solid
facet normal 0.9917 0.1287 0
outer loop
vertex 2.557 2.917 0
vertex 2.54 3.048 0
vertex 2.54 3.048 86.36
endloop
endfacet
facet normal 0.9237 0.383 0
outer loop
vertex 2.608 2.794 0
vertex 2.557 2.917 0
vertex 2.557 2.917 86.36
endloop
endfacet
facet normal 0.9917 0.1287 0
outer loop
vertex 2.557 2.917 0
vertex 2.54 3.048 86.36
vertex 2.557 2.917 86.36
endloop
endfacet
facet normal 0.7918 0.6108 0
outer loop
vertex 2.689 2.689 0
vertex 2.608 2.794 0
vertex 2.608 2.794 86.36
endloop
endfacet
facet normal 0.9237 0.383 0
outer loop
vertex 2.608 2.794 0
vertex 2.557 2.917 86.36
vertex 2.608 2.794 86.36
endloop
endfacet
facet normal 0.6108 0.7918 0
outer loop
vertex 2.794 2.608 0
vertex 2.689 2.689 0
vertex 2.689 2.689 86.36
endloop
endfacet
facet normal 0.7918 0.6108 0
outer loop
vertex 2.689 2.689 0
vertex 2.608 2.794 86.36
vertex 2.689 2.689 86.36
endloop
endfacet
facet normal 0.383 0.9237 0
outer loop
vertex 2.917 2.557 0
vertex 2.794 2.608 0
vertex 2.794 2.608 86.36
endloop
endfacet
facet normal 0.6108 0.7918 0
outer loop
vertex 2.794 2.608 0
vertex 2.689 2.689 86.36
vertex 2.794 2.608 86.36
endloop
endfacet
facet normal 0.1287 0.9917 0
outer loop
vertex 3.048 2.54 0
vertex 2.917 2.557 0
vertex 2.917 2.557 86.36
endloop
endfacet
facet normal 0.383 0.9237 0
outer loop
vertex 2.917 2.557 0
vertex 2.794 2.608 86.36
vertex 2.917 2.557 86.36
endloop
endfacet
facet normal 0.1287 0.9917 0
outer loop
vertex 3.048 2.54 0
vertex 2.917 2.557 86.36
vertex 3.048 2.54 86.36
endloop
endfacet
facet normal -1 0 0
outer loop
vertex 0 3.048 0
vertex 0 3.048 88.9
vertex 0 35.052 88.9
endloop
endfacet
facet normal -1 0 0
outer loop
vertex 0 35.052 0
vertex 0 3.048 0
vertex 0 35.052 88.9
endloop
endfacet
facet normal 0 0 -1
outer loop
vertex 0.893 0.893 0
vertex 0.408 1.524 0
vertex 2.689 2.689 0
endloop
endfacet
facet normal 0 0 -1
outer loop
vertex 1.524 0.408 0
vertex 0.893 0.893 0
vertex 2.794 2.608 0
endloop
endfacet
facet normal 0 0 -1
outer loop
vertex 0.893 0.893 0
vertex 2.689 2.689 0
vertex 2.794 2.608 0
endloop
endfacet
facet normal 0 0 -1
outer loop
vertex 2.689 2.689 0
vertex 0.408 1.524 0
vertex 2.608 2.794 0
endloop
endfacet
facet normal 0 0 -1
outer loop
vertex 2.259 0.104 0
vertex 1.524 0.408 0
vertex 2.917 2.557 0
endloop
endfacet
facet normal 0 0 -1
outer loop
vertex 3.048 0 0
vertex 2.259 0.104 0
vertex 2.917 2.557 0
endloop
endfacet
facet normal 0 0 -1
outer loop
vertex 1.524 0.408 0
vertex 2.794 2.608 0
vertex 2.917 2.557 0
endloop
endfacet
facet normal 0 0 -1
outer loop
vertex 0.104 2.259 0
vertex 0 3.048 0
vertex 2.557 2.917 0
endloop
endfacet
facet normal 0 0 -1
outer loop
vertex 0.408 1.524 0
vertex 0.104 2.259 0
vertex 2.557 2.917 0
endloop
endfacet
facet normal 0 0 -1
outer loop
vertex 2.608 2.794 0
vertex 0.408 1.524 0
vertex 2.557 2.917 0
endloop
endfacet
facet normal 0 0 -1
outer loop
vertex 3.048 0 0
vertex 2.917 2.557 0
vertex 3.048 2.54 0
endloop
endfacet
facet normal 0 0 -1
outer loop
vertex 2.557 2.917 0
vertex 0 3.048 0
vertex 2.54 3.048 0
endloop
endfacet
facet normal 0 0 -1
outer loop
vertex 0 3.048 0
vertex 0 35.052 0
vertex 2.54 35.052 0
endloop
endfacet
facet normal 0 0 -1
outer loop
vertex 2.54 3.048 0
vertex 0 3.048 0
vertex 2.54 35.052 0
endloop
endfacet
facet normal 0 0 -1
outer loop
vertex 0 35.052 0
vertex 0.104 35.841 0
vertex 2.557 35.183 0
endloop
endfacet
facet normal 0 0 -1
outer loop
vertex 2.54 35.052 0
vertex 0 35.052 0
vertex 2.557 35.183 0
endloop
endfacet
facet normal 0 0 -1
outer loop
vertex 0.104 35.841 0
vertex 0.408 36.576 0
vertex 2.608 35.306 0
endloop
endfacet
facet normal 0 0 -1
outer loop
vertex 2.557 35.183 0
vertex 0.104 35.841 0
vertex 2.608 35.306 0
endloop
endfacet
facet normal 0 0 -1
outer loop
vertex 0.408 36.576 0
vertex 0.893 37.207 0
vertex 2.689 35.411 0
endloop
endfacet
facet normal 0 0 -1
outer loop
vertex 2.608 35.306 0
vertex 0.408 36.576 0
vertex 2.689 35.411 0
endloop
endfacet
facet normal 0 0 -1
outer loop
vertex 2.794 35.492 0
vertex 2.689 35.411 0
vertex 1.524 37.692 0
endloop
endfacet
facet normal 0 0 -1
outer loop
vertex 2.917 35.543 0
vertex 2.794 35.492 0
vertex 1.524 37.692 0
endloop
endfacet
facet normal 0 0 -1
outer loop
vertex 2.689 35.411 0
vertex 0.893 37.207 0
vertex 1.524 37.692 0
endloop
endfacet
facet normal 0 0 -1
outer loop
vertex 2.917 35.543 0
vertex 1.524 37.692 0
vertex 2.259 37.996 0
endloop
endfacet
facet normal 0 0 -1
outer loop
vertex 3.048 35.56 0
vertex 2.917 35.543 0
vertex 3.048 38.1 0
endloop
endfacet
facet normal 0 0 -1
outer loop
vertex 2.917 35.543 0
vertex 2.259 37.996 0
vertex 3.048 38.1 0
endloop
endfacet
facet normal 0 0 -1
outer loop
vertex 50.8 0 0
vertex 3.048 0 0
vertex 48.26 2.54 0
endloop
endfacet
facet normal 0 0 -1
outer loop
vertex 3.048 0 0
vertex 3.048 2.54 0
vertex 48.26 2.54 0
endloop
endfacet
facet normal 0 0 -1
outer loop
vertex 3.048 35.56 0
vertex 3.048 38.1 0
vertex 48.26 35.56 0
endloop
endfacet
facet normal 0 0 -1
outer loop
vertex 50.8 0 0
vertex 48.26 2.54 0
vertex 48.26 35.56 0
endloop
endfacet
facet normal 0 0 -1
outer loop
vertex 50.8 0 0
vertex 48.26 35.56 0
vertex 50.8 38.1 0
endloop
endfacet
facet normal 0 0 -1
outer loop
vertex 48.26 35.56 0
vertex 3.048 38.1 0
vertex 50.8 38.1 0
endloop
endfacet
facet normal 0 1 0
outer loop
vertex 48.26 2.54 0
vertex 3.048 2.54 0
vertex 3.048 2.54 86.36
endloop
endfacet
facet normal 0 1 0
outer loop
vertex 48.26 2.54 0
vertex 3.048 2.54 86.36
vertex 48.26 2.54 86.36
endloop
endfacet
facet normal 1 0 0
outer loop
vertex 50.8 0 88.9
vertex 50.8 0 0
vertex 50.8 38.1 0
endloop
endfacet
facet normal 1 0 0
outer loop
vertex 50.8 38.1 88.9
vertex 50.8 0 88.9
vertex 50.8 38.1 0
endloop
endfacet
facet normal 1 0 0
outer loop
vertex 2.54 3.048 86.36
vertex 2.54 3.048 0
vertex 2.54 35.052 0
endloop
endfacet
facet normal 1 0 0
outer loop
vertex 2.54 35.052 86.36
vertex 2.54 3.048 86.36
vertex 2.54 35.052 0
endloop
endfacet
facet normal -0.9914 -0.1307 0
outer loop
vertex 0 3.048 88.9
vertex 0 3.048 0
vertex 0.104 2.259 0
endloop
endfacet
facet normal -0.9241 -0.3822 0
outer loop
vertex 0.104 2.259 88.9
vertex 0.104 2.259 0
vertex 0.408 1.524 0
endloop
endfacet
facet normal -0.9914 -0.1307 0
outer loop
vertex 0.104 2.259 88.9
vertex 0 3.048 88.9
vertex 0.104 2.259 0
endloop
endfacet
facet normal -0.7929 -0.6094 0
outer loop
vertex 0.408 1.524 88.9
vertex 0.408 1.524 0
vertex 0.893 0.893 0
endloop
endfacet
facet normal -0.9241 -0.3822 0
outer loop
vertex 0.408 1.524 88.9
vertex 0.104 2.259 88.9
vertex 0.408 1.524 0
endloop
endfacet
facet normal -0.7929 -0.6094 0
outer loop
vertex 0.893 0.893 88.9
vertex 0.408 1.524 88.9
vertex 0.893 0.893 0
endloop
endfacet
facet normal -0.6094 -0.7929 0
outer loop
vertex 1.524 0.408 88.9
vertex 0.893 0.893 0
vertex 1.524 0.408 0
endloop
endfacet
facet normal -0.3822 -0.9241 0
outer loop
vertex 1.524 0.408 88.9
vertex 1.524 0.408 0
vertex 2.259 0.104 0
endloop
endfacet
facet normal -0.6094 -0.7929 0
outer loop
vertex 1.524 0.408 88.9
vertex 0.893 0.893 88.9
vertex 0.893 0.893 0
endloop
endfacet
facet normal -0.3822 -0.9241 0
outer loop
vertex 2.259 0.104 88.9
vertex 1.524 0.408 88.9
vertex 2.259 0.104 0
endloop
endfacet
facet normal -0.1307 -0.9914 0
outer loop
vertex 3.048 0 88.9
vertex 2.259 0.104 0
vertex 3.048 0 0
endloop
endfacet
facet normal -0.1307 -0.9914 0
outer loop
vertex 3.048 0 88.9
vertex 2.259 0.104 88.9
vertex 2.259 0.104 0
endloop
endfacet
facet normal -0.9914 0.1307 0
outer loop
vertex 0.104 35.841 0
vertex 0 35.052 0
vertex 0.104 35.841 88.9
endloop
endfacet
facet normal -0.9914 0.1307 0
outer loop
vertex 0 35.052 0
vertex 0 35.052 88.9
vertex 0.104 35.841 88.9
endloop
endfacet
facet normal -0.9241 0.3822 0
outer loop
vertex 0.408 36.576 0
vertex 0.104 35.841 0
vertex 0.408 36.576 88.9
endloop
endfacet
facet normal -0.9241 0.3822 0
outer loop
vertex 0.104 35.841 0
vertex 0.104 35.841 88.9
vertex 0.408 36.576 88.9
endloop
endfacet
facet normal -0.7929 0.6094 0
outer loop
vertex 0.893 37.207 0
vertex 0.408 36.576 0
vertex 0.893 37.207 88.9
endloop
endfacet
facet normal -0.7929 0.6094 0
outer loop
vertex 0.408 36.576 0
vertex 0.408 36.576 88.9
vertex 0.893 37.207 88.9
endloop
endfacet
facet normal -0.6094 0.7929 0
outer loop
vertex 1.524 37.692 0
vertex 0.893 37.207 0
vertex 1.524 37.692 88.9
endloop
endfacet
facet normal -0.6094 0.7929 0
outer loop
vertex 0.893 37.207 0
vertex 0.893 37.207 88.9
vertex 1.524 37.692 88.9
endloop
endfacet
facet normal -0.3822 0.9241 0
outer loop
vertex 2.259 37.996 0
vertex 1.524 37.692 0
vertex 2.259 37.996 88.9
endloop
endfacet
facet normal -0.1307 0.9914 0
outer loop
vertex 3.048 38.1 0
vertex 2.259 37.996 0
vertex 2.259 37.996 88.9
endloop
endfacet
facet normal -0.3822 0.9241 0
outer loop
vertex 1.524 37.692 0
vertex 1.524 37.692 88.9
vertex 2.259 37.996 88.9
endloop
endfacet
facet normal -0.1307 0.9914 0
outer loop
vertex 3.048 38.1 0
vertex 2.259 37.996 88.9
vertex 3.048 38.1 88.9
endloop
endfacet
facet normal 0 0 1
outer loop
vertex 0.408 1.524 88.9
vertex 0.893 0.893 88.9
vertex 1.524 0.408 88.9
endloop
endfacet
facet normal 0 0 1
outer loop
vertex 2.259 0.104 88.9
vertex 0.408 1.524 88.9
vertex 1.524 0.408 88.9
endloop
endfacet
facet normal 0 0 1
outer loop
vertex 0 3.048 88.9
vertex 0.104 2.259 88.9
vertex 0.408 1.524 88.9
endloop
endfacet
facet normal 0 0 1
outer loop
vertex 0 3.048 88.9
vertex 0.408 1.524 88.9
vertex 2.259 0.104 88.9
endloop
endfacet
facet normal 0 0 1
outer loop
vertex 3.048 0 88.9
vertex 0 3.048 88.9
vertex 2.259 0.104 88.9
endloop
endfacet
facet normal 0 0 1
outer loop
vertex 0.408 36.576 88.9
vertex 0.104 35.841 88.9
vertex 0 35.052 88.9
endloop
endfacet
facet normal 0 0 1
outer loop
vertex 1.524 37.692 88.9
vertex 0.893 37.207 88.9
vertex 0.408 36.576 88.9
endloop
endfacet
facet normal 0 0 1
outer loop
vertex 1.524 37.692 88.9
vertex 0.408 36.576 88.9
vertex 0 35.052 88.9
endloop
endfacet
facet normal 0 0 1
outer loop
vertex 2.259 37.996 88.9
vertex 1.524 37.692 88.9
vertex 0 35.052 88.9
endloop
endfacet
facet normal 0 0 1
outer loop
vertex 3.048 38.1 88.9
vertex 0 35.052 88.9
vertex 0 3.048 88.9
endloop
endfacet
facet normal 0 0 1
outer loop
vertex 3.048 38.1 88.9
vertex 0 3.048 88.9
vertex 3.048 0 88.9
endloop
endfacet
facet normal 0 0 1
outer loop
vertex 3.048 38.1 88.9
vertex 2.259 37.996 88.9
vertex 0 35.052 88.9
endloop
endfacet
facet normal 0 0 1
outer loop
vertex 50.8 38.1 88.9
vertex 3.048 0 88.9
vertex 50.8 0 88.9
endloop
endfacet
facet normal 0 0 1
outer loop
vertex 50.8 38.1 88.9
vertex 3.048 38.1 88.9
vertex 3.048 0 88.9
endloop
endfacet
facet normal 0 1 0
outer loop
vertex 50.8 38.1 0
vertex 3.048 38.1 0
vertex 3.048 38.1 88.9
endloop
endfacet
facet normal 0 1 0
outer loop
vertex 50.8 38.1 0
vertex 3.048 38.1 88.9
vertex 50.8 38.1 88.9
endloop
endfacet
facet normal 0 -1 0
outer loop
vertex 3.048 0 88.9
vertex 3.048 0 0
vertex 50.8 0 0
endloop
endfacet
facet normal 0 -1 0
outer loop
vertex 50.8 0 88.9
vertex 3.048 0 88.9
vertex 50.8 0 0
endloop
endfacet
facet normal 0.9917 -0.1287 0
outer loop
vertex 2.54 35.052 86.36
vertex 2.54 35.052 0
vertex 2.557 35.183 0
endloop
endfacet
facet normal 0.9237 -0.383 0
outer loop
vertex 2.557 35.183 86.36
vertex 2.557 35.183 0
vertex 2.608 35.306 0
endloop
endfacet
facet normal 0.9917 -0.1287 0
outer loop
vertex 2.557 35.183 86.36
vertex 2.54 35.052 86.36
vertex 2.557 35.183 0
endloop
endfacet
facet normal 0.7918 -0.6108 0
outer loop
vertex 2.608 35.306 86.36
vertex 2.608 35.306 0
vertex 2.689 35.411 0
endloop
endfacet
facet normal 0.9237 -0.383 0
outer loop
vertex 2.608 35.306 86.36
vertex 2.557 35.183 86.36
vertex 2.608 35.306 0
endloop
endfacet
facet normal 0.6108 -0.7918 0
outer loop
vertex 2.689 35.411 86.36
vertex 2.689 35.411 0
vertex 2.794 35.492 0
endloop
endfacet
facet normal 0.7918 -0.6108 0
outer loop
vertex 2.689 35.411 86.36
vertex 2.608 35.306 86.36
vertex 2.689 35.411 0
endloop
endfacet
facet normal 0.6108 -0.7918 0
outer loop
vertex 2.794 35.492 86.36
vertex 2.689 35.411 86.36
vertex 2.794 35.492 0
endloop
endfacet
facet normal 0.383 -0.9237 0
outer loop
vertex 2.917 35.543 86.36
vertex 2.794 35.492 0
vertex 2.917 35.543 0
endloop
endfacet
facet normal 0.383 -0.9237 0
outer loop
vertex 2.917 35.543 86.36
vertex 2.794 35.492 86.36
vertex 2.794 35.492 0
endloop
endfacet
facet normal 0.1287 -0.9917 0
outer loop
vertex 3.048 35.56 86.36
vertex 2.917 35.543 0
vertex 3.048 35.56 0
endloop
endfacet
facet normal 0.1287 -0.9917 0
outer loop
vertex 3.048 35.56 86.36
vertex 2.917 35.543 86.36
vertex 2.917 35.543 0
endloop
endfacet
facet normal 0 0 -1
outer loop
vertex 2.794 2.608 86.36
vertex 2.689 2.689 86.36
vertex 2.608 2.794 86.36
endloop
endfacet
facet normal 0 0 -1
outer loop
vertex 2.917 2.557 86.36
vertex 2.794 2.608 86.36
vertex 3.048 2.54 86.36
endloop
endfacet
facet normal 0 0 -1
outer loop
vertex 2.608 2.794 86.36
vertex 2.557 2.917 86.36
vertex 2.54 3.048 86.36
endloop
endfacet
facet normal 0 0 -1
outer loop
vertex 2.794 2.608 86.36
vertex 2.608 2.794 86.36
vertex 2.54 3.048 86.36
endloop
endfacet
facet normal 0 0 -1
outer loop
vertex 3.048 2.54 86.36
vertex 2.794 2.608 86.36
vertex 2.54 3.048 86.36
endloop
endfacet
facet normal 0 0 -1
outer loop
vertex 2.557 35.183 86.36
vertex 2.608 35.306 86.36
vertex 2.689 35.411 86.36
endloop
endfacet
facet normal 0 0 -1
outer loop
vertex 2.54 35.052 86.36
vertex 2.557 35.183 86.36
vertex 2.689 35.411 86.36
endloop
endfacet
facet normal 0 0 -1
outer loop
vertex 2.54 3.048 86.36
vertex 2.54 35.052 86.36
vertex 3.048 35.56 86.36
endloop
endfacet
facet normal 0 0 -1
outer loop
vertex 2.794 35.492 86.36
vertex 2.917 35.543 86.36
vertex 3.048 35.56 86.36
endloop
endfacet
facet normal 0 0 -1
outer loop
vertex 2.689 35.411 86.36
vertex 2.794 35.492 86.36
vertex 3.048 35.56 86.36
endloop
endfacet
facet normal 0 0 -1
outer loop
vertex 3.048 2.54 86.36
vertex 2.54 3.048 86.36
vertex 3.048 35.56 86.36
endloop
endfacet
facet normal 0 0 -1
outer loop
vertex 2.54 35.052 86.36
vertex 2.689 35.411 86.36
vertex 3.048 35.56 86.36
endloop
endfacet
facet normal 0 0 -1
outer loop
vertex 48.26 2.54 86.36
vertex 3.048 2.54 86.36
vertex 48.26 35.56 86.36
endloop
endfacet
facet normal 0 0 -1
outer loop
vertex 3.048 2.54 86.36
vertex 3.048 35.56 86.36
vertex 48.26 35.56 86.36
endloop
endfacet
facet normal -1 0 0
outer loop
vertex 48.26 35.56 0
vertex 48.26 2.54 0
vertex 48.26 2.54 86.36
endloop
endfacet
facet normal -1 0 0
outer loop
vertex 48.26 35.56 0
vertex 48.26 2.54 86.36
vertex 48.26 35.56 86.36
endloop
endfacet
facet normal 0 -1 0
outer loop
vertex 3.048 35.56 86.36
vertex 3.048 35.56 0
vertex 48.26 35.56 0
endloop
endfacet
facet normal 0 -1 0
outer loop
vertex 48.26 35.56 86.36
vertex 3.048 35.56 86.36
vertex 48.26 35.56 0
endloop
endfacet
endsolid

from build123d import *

# Parameters (mm, degrees)
F0_W     = 50.8
F0_H     = 38.1
F1_DEPTH = 88.9
F2_R     = 3.048
F3_T     = -2.54


with BuildPart() as f1:
    # F0 (on Top) → F1 (new body)
    with BuildSketch(Plane.XY):
        with Locations((25.4, 19.05)):
            Rectangle(F0_W, F0_H)
    extrude(amount=F1_DEPTH)

    # F2
    f2_edges = [f1.edges().sort_by_distance(p)[0] for p in [
        (0, 0, 44.45),
        (0, 38.1, 44.45),
    ]]
    fillet(f2_edges, radius=F2_R)

    # F3
    f3_openings = [f1.faces().sort_by_distance(p)[0] for p in [
        (25.451031, 19.05, 0),
    ]]
    offset(amount=F3_T, openings=f3_openings)


solid = f1.part
